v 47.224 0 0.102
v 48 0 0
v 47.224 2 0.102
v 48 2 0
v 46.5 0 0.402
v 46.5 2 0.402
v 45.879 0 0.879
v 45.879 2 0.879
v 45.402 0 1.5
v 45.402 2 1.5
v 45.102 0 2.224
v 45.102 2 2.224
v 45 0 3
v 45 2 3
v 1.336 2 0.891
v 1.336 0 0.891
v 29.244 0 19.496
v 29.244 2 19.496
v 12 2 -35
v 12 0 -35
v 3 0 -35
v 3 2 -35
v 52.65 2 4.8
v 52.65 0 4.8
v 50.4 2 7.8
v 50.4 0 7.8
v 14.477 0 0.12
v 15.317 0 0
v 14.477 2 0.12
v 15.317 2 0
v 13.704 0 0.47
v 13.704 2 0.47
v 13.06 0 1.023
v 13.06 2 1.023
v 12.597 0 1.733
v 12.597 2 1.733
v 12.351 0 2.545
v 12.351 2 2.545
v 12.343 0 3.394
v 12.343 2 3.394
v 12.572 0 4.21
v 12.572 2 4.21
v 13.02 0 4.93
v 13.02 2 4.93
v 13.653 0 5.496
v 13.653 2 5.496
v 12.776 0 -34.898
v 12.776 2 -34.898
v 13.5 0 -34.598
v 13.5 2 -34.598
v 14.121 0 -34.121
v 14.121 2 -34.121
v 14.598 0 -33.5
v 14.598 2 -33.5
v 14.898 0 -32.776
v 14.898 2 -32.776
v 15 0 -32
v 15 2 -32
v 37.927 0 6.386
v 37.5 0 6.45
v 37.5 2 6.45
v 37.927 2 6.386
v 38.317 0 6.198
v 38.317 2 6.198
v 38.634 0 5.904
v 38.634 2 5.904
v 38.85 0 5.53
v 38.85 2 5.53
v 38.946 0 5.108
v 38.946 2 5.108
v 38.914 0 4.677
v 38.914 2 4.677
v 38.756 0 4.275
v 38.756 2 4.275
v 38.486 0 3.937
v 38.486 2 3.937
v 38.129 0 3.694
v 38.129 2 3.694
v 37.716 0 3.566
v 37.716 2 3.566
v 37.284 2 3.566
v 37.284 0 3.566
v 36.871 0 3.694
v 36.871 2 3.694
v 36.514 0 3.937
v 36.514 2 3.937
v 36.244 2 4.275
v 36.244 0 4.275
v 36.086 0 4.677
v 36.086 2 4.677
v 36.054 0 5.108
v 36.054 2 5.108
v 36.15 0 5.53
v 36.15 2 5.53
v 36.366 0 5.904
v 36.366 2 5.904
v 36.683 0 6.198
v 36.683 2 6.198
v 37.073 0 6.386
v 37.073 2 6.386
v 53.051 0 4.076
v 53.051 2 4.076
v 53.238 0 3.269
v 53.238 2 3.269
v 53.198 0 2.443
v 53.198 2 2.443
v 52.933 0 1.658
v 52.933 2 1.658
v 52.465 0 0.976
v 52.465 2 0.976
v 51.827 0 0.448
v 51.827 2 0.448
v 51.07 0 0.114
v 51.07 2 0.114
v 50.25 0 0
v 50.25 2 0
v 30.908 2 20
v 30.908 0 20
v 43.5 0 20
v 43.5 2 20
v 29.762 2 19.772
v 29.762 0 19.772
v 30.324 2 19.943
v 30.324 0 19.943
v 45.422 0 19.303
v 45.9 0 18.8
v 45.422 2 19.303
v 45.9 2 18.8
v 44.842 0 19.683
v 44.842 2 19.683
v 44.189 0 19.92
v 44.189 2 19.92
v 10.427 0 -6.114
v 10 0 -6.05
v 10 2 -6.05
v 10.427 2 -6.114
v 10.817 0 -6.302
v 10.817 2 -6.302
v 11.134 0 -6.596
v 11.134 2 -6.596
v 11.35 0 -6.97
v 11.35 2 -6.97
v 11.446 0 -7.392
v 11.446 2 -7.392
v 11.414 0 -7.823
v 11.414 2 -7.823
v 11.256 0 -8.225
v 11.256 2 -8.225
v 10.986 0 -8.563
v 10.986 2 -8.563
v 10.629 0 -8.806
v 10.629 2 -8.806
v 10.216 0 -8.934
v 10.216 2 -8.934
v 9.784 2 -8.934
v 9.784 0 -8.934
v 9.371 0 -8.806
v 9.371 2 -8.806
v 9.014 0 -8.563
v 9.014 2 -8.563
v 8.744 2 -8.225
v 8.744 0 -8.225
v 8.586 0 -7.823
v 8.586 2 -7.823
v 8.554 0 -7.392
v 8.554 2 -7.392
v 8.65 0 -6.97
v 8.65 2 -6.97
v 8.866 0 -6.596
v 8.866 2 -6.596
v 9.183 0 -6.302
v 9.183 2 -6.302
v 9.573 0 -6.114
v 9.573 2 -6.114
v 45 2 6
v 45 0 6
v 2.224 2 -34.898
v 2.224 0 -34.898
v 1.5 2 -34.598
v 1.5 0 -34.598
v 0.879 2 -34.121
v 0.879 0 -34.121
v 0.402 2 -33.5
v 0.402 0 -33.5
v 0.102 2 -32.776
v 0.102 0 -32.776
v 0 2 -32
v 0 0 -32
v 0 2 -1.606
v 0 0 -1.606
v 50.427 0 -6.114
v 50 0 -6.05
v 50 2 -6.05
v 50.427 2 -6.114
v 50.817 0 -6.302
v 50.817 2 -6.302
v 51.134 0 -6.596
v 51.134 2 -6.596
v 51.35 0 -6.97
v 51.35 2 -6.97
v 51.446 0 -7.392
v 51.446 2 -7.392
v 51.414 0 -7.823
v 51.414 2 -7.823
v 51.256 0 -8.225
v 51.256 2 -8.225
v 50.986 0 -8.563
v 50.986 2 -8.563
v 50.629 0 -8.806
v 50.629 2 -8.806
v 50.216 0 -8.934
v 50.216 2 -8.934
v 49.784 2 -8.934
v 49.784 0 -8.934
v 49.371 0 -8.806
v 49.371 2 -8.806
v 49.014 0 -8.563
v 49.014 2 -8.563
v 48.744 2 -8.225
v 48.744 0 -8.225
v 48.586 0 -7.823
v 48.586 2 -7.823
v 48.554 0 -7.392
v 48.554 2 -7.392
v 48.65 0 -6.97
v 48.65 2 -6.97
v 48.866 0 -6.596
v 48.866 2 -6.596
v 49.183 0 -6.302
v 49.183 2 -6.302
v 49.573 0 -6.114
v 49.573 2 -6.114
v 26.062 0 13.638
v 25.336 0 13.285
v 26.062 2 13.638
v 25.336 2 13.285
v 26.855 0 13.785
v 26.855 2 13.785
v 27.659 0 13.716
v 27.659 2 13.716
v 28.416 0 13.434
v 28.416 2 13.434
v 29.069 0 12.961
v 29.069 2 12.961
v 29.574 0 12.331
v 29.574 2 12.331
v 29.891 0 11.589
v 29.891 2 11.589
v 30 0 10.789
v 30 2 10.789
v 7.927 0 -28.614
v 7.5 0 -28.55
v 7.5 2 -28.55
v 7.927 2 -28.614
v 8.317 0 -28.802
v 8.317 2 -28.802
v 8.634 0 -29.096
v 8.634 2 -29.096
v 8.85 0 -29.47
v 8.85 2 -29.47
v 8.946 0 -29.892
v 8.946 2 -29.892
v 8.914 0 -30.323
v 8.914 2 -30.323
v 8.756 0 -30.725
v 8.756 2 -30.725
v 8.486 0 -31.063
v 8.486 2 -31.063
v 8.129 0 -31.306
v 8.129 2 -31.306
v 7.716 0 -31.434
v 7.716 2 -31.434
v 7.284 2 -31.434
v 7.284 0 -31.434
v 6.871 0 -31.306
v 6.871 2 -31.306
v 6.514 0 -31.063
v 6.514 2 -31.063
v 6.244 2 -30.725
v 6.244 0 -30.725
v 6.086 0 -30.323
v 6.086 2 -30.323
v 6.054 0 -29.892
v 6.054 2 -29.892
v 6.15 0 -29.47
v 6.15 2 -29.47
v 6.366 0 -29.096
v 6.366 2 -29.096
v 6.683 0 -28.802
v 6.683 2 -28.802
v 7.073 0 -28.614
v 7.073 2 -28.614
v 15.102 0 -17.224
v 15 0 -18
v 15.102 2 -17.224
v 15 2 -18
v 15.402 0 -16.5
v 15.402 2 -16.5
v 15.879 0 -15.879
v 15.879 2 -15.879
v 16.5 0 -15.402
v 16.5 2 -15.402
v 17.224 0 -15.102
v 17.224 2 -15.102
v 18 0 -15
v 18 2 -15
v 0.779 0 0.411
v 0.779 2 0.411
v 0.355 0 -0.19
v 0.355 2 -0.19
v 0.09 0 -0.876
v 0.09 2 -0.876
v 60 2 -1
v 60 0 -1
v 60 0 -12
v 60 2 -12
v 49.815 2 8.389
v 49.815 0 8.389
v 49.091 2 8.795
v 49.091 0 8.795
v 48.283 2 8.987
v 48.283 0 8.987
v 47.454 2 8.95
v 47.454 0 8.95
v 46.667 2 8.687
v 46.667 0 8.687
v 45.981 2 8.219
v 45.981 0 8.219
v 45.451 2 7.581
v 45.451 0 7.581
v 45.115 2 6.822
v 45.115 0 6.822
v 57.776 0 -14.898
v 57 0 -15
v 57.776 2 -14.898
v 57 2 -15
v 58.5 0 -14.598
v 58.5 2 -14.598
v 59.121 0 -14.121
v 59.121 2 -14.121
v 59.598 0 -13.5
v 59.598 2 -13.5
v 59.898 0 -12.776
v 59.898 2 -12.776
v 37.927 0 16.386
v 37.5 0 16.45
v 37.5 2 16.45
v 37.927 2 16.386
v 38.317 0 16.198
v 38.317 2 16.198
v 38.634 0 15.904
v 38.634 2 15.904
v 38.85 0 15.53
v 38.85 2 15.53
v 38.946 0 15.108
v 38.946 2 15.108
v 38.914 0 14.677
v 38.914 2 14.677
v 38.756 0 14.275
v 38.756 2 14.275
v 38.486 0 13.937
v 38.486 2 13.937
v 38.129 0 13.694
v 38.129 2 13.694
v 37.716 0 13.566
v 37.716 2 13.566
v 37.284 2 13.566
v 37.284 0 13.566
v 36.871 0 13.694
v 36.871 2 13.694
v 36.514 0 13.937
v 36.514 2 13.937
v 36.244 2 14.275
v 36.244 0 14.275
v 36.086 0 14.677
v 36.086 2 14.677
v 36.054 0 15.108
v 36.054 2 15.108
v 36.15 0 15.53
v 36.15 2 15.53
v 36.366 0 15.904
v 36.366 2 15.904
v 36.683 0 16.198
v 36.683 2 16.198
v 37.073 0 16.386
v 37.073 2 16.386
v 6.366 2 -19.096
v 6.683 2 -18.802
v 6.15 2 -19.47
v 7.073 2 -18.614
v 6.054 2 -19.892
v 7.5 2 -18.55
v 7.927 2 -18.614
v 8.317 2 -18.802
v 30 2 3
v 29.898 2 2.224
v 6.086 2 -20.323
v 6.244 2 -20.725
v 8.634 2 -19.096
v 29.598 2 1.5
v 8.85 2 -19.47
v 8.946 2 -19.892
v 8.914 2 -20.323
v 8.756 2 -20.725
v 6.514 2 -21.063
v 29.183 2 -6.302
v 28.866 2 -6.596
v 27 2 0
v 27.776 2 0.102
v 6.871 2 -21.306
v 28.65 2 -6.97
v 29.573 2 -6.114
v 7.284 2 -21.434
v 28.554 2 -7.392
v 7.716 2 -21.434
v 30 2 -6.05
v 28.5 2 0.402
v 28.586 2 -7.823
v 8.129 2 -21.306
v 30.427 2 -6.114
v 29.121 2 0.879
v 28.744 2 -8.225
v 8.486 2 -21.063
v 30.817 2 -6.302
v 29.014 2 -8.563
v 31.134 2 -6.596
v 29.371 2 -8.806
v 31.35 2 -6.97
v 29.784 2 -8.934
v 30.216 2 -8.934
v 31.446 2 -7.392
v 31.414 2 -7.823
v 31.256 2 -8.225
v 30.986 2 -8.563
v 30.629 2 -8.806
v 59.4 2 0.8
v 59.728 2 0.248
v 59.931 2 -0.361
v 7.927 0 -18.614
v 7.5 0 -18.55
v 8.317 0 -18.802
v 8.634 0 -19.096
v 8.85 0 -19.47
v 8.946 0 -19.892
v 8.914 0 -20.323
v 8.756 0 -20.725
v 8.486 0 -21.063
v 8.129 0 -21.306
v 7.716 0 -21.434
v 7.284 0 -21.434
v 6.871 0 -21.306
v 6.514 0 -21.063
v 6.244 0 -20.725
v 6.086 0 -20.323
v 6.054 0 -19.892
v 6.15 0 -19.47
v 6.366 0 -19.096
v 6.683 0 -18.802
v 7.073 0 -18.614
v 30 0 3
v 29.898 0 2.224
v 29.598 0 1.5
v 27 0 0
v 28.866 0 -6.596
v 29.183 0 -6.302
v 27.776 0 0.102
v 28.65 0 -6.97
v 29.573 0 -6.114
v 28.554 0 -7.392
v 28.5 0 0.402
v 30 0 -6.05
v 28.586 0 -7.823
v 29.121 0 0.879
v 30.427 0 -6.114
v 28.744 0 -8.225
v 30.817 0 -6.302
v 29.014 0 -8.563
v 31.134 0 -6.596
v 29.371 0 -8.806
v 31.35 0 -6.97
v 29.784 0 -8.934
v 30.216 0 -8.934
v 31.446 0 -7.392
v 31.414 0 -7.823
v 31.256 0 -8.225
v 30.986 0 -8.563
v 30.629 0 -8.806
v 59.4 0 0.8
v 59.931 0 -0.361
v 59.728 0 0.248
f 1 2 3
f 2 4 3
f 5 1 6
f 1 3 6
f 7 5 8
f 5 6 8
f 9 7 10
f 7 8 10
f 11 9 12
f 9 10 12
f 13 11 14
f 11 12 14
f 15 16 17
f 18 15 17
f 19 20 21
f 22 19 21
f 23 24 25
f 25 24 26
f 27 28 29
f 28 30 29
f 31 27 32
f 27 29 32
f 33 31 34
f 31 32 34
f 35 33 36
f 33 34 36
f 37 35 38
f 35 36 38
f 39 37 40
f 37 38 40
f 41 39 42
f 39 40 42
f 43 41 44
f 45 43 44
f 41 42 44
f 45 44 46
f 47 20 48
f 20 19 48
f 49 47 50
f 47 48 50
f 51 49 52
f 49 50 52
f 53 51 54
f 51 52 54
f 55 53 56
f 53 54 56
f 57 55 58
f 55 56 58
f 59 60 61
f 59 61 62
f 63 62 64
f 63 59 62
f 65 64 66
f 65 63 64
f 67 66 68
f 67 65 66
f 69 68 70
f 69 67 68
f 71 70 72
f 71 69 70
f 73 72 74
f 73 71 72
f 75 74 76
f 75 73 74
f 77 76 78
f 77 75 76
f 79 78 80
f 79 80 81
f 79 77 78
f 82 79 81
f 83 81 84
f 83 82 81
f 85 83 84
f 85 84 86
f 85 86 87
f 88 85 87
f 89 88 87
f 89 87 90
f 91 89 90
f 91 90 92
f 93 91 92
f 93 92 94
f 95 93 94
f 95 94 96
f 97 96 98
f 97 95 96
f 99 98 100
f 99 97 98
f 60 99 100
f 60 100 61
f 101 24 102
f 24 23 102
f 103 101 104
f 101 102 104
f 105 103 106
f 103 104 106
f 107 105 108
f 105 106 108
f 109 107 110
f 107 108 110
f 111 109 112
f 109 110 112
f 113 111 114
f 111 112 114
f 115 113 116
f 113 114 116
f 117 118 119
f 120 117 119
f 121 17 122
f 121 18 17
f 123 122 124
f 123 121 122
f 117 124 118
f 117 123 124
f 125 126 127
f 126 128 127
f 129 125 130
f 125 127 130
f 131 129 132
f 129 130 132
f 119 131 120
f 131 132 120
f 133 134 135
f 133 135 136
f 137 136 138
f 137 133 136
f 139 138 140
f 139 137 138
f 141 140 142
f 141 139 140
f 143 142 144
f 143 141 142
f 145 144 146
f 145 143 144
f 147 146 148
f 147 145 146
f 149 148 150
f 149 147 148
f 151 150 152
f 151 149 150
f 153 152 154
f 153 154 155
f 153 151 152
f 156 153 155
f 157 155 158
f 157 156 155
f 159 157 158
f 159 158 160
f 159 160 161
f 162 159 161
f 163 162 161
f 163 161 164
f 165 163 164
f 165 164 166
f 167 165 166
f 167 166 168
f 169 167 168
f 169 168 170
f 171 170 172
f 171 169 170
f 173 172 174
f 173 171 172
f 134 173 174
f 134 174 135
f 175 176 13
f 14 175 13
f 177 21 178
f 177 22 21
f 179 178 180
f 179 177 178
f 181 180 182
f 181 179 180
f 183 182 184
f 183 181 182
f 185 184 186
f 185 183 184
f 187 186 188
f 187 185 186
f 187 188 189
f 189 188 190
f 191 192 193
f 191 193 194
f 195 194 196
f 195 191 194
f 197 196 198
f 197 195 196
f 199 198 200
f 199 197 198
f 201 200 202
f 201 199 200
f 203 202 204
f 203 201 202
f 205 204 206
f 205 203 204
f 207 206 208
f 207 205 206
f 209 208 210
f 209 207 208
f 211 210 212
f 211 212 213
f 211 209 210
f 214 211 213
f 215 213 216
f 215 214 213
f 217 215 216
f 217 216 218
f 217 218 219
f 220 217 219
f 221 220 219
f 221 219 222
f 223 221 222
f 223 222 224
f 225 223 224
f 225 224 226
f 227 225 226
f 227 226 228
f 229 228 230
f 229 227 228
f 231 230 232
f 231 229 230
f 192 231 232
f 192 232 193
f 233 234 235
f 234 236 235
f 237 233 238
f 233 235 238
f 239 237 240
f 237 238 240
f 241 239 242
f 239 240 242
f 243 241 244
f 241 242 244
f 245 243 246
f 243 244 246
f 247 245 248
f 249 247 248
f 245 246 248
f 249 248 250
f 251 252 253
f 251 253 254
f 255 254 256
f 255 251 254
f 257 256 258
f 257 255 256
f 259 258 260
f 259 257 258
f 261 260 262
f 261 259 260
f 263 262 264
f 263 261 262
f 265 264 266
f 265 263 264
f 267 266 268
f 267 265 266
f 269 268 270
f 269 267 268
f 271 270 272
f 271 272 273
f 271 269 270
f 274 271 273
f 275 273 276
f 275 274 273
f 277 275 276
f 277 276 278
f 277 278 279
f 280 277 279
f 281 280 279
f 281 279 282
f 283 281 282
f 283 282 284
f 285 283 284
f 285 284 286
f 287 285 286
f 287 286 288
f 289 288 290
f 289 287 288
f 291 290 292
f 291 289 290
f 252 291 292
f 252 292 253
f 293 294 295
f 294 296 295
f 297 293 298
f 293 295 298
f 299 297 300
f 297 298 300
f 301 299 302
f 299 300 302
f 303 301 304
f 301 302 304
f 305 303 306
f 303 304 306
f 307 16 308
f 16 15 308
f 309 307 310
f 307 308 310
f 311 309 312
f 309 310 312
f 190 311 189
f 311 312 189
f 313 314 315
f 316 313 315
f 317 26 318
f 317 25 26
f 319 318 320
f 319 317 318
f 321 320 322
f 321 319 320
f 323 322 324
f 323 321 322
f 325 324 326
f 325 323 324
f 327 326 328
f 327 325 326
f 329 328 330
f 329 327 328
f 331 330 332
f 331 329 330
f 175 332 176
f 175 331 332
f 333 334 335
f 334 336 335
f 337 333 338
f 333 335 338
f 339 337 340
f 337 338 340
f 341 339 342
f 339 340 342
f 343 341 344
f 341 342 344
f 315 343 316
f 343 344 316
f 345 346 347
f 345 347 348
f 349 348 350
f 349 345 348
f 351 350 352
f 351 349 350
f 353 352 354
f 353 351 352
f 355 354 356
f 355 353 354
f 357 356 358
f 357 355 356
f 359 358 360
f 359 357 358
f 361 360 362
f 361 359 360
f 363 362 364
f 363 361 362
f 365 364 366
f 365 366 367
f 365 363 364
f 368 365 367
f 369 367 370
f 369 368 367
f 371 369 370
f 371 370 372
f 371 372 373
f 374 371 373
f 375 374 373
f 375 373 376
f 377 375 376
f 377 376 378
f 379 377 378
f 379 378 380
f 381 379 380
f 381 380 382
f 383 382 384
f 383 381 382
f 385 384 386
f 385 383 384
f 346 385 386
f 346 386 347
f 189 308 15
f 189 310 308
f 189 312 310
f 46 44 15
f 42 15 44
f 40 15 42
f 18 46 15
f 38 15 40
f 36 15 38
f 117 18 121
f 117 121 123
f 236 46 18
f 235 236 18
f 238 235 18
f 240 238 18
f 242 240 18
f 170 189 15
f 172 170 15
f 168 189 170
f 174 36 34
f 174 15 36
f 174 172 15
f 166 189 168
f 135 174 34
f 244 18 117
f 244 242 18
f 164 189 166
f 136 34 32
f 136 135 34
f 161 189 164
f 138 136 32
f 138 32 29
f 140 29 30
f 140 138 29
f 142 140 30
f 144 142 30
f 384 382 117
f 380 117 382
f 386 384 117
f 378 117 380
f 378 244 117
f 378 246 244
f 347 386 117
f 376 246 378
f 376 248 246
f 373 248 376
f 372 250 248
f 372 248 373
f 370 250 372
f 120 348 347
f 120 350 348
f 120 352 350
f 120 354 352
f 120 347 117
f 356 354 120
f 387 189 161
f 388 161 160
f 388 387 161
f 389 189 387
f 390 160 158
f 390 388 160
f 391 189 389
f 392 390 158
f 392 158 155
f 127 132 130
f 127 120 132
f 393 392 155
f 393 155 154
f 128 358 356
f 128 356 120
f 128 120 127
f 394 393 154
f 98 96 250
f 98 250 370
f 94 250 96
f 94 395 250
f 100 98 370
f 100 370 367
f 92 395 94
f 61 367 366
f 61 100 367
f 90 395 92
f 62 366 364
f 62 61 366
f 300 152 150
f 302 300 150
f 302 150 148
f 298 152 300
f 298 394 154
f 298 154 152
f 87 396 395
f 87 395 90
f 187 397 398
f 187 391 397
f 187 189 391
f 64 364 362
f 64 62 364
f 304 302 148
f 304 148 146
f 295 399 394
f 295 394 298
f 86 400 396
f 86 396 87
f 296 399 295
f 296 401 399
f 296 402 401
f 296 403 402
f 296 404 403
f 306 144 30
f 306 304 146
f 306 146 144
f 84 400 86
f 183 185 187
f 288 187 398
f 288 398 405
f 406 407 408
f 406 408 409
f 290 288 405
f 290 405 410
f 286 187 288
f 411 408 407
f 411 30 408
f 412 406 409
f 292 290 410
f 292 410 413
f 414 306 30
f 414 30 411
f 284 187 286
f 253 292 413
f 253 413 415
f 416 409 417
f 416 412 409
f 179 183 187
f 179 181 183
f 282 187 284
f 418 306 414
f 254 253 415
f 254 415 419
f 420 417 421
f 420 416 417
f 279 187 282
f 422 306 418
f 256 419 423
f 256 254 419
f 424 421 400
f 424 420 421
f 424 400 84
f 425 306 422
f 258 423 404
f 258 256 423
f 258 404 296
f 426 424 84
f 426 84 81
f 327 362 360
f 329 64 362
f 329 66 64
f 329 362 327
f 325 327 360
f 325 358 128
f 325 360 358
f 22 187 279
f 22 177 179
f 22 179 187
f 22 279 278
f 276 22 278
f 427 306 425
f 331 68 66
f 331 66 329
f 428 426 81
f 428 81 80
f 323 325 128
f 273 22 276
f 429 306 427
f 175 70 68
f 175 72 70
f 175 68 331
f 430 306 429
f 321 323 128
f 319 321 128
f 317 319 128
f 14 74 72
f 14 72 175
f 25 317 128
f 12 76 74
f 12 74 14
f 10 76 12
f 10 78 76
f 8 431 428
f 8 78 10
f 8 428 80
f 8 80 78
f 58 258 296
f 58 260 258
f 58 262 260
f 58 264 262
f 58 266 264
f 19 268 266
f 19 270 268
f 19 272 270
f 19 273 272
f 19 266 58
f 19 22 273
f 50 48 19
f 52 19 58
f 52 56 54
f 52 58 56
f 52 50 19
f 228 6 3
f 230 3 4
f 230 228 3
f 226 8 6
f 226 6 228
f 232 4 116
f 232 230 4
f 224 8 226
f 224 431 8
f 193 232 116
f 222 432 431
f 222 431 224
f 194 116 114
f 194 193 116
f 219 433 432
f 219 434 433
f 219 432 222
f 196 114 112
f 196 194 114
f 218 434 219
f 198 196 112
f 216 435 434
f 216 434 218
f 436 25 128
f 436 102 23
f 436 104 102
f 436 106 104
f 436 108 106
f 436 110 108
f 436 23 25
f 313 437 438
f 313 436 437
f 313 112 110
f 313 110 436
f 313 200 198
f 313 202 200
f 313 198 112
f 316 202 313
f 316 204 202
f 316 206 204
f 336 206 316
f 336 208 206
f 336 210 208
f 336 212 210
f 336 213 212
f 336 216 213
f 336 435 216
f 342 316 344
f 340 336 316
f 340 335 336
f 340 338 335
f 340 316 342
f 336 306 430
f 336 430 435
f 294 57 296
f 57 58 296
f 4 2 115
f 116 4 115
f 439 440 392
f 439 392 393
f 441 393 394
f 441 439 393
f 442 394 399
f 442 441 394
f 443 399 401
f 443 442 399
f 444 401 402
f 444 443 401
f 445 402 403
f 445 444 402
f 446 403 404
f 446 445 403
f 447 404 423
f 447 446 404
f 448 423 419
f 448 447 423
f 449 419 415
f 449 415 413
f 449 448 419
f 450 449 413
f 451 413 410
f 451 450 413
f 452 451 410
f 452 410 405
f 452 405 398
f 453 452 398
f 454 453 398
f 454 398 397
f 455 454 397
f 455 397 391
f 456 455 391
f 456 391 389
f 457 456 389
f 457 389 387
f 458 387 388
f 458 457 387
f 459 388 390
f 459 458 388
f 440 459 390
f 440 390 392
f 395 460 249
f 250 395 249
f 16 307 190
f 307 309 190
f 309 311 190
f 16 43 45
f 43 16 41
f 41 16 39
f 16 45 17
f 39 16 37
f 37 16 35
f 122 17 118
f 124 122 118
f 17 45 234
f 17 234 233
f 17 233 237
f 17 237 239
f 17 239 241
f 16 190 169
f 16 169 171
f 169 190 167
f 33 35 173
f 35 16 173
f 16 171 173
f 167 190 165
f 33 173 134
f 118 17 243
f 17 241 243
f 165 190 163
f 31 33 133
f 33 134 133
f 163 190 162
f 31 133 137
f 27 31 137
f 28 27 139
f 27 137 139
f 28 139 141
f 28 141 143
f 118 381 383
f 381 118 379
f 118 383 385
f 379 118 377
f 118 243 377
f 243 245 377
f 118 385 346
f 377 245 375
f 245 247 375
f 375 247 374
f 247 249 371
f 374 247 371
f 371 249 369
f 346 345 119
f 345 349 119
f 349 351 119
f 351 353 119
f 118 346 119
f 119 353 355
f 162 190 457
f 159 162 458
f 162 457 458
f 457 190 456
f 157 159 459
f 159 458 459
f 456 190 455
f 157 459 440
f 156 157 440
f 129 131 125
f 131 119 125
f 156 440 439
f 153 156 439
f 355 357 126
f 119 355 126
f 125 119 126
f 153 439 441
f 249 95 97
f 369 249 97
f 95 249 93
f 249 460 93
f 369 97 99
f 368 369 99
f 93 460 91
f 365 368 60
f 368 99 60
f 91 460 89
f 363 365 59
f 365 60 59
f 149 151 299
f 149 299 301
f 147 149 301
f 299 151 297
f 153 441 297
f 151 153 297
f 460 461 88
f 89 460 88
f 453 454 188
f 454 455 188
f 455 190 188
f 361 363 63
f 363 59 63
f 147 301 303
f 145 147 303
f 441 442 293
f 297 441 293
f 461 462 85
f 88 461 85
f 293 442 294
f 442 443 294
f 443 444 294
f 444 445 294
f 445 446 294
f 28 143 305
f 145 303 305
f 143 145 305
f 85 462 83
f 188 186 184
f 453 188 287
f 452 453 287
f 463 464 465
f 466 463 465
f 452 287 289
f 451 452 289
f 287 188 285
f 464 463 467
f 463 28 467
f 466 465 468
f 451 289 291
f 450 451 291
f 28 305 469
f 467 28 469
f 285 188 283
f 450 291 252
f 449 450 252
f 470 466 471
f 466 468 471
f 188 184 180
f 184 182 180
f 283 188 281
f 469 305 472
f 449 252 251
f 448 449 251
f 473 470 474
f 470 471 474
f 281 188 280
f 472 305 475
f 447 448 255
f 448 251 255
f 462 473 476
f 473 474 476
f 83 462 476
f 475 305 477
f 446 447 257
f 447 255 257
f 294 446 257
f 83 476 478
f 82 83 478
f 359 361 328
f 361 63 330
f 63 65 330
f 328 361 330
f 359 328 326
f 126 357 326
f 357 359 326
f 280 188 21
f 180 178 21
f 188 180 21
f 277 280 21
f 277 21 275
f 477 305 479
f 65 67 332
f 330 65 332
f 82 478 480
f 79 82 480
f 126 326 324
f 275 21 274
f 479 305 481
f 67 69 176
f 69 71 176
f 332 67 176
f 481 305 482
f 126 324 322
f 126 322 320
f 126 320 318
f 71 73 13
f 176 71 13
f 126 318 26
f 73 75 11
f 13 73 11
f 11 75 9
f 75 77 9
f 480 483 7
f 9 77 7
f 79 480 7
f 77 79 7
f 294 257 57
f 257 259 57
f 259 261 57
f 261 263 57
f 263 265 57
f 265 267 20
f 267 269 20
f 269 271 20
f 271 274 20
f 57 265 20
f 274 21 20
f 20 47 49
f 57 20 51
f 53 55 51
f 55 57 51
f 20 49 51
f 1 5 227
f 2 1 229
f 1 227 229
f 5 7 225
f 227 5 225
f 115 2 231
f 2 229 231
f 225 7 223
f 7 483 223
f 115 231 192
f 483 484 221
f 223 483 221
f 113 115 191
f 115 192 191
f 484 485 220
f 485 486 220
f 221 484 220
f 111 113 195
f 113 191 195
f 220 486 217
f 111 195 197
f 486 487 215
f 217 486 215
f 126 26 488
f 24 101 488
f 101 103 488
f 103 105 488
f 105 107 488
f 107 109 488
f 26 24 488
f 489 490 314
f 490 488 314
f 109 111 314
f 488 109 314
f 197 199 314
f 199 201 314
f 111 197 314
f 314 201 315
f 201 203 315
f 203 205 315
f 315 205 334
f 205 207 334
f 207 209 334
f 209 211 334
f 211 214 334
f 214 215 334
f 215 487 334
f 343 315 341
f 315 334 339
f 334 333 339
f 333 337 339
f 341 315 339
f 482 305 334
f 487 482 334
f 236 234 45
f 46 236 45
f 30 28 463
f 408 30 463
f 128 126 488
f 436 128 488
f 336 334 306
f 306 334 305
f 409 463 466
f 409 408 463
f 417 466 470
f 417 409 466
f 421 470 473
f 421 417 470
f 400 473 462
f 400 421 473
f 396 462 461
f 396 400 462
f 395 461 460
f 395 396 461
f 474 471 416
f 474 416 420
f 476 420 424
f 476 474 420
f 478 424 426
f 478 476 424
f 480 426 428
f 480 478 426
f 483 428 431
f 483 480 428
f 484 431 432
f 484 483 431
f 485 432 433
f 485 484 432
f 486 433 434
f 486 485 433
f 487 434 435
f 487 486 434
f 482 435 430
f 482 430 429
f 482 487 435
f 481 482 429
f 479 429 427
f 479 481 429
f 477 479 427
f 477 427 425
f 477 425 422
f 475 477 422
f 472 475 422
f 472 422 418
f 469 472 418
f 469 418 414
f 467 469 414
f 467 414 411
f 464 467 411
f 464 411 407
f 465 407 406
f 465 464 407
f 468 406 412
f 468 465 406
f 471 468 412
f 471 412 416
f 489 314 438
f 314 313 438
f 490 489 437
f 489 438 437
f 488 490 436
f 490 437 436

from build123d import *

# Parameters (mm, degrees)
SKETCH_1_R          = 1.45
EXTRUDE_1_DEPTH     = 2
CUT_EXTRUDE_1_DEPTH = 70.491006612
FILLET_1_R          = 3


with BuildPart() as part:
    # 草图1 → 凸台-拉伸1 (new body)
    with BuildSketch(Plane(origin=(0, 0, 0), x_dir=(1, 0, 0), z_dir=(0, 1, 0))):
        Polygon((0, 15), (0, 0), (30, -20), (45, -20), (60, 0), (60, 15), (45, 15), (32, 15), (15, 35), (0, 35), align=None)
        Polygon((30, -16.394448725), (5.408326913, 0), (30, 0), align=None, mode=Mode.SUBTRACT)
        with Locations(Location((37.5, -15, 0), (0, 0, 270))):
            Circle(SKETCH_1_R, mode=Mode.SUBTRACT)
        Polygon((45, 0), (56.25, 0), (45, -15), align=None, mode=Mode.SUBTRACT)
        with Locations(Location((37.5, -5, 0), (0, 0, 270))):
            Circle(SKETCH_1_R, mode=Mode.SUBTRACT)
        with Locations(Location((10, 7.5, 0), (0, 0, 270))):
            Circle(SKETCH_1_R, mode=Mode.SUBTRACT)
        with Locations(Location((7.5, 20, 0), (0, 0, 270))):
            Circle(SKETCH_1_R, mode=Mode.SUBTRACT)
        with Locations(Location((7.5, 30, 0), (0, 0, 270))):
            Circle(SKETCH_1_R, mode=Mode.SUBTRACT)
        Polygon((15, 28.82380953), (26.750238101, 15), (15, 15), align=None, mode=Mode.SUBTRACT)
        with Locations(Location((30, 7.5, 0), (0, 0, 270))):
            Circle(SKETCH_1_R, mode=Mode.SUBTRACT)
        with Locations(Location((50, 7.5, 0), (0, 0, 270))):
            Circle(SKETCH_1_R, mode=Mode.SUBTRACT)
    extrude(amount=EXTRUDE_1_DEPTH)

    # 草图2 → 切除-拉伸1 (cut, through all)
    with BuildSketch(Plane(origin=(0, 2, 0), x_dir=(1, 0, 0), z_dir=(0, 1, 0))):
        Polygon((15, 35), (15, 15), (32, 15), align=None)
    extrude(amount=-CUT_EXTRUDE_1_DEPTH, mode=Mode.SUBTRACT)

    # 圆角1
    fillet_1_edges = [part.edges().sort_by_distance(p)[0] for p in [
        (15, 1, -15),
        (45, 1, 15),
        (56.25, 1, 0),
        (45, 1, 0),
        (30, 1, 0),
        (5.408326913, 1, 0),
        (30, 1, 16.394448725),
        (60, 1, -15),
        (60, 1, 0),
        (45, 1, 20),
        (30, 1, 20),
        (0, 1, 0),
        (0, 1, -35),
        (15, 1, -35),
    ]]
    fillet(fillet_1_edges, radius=FILLET_1_R)


solid = part.part
